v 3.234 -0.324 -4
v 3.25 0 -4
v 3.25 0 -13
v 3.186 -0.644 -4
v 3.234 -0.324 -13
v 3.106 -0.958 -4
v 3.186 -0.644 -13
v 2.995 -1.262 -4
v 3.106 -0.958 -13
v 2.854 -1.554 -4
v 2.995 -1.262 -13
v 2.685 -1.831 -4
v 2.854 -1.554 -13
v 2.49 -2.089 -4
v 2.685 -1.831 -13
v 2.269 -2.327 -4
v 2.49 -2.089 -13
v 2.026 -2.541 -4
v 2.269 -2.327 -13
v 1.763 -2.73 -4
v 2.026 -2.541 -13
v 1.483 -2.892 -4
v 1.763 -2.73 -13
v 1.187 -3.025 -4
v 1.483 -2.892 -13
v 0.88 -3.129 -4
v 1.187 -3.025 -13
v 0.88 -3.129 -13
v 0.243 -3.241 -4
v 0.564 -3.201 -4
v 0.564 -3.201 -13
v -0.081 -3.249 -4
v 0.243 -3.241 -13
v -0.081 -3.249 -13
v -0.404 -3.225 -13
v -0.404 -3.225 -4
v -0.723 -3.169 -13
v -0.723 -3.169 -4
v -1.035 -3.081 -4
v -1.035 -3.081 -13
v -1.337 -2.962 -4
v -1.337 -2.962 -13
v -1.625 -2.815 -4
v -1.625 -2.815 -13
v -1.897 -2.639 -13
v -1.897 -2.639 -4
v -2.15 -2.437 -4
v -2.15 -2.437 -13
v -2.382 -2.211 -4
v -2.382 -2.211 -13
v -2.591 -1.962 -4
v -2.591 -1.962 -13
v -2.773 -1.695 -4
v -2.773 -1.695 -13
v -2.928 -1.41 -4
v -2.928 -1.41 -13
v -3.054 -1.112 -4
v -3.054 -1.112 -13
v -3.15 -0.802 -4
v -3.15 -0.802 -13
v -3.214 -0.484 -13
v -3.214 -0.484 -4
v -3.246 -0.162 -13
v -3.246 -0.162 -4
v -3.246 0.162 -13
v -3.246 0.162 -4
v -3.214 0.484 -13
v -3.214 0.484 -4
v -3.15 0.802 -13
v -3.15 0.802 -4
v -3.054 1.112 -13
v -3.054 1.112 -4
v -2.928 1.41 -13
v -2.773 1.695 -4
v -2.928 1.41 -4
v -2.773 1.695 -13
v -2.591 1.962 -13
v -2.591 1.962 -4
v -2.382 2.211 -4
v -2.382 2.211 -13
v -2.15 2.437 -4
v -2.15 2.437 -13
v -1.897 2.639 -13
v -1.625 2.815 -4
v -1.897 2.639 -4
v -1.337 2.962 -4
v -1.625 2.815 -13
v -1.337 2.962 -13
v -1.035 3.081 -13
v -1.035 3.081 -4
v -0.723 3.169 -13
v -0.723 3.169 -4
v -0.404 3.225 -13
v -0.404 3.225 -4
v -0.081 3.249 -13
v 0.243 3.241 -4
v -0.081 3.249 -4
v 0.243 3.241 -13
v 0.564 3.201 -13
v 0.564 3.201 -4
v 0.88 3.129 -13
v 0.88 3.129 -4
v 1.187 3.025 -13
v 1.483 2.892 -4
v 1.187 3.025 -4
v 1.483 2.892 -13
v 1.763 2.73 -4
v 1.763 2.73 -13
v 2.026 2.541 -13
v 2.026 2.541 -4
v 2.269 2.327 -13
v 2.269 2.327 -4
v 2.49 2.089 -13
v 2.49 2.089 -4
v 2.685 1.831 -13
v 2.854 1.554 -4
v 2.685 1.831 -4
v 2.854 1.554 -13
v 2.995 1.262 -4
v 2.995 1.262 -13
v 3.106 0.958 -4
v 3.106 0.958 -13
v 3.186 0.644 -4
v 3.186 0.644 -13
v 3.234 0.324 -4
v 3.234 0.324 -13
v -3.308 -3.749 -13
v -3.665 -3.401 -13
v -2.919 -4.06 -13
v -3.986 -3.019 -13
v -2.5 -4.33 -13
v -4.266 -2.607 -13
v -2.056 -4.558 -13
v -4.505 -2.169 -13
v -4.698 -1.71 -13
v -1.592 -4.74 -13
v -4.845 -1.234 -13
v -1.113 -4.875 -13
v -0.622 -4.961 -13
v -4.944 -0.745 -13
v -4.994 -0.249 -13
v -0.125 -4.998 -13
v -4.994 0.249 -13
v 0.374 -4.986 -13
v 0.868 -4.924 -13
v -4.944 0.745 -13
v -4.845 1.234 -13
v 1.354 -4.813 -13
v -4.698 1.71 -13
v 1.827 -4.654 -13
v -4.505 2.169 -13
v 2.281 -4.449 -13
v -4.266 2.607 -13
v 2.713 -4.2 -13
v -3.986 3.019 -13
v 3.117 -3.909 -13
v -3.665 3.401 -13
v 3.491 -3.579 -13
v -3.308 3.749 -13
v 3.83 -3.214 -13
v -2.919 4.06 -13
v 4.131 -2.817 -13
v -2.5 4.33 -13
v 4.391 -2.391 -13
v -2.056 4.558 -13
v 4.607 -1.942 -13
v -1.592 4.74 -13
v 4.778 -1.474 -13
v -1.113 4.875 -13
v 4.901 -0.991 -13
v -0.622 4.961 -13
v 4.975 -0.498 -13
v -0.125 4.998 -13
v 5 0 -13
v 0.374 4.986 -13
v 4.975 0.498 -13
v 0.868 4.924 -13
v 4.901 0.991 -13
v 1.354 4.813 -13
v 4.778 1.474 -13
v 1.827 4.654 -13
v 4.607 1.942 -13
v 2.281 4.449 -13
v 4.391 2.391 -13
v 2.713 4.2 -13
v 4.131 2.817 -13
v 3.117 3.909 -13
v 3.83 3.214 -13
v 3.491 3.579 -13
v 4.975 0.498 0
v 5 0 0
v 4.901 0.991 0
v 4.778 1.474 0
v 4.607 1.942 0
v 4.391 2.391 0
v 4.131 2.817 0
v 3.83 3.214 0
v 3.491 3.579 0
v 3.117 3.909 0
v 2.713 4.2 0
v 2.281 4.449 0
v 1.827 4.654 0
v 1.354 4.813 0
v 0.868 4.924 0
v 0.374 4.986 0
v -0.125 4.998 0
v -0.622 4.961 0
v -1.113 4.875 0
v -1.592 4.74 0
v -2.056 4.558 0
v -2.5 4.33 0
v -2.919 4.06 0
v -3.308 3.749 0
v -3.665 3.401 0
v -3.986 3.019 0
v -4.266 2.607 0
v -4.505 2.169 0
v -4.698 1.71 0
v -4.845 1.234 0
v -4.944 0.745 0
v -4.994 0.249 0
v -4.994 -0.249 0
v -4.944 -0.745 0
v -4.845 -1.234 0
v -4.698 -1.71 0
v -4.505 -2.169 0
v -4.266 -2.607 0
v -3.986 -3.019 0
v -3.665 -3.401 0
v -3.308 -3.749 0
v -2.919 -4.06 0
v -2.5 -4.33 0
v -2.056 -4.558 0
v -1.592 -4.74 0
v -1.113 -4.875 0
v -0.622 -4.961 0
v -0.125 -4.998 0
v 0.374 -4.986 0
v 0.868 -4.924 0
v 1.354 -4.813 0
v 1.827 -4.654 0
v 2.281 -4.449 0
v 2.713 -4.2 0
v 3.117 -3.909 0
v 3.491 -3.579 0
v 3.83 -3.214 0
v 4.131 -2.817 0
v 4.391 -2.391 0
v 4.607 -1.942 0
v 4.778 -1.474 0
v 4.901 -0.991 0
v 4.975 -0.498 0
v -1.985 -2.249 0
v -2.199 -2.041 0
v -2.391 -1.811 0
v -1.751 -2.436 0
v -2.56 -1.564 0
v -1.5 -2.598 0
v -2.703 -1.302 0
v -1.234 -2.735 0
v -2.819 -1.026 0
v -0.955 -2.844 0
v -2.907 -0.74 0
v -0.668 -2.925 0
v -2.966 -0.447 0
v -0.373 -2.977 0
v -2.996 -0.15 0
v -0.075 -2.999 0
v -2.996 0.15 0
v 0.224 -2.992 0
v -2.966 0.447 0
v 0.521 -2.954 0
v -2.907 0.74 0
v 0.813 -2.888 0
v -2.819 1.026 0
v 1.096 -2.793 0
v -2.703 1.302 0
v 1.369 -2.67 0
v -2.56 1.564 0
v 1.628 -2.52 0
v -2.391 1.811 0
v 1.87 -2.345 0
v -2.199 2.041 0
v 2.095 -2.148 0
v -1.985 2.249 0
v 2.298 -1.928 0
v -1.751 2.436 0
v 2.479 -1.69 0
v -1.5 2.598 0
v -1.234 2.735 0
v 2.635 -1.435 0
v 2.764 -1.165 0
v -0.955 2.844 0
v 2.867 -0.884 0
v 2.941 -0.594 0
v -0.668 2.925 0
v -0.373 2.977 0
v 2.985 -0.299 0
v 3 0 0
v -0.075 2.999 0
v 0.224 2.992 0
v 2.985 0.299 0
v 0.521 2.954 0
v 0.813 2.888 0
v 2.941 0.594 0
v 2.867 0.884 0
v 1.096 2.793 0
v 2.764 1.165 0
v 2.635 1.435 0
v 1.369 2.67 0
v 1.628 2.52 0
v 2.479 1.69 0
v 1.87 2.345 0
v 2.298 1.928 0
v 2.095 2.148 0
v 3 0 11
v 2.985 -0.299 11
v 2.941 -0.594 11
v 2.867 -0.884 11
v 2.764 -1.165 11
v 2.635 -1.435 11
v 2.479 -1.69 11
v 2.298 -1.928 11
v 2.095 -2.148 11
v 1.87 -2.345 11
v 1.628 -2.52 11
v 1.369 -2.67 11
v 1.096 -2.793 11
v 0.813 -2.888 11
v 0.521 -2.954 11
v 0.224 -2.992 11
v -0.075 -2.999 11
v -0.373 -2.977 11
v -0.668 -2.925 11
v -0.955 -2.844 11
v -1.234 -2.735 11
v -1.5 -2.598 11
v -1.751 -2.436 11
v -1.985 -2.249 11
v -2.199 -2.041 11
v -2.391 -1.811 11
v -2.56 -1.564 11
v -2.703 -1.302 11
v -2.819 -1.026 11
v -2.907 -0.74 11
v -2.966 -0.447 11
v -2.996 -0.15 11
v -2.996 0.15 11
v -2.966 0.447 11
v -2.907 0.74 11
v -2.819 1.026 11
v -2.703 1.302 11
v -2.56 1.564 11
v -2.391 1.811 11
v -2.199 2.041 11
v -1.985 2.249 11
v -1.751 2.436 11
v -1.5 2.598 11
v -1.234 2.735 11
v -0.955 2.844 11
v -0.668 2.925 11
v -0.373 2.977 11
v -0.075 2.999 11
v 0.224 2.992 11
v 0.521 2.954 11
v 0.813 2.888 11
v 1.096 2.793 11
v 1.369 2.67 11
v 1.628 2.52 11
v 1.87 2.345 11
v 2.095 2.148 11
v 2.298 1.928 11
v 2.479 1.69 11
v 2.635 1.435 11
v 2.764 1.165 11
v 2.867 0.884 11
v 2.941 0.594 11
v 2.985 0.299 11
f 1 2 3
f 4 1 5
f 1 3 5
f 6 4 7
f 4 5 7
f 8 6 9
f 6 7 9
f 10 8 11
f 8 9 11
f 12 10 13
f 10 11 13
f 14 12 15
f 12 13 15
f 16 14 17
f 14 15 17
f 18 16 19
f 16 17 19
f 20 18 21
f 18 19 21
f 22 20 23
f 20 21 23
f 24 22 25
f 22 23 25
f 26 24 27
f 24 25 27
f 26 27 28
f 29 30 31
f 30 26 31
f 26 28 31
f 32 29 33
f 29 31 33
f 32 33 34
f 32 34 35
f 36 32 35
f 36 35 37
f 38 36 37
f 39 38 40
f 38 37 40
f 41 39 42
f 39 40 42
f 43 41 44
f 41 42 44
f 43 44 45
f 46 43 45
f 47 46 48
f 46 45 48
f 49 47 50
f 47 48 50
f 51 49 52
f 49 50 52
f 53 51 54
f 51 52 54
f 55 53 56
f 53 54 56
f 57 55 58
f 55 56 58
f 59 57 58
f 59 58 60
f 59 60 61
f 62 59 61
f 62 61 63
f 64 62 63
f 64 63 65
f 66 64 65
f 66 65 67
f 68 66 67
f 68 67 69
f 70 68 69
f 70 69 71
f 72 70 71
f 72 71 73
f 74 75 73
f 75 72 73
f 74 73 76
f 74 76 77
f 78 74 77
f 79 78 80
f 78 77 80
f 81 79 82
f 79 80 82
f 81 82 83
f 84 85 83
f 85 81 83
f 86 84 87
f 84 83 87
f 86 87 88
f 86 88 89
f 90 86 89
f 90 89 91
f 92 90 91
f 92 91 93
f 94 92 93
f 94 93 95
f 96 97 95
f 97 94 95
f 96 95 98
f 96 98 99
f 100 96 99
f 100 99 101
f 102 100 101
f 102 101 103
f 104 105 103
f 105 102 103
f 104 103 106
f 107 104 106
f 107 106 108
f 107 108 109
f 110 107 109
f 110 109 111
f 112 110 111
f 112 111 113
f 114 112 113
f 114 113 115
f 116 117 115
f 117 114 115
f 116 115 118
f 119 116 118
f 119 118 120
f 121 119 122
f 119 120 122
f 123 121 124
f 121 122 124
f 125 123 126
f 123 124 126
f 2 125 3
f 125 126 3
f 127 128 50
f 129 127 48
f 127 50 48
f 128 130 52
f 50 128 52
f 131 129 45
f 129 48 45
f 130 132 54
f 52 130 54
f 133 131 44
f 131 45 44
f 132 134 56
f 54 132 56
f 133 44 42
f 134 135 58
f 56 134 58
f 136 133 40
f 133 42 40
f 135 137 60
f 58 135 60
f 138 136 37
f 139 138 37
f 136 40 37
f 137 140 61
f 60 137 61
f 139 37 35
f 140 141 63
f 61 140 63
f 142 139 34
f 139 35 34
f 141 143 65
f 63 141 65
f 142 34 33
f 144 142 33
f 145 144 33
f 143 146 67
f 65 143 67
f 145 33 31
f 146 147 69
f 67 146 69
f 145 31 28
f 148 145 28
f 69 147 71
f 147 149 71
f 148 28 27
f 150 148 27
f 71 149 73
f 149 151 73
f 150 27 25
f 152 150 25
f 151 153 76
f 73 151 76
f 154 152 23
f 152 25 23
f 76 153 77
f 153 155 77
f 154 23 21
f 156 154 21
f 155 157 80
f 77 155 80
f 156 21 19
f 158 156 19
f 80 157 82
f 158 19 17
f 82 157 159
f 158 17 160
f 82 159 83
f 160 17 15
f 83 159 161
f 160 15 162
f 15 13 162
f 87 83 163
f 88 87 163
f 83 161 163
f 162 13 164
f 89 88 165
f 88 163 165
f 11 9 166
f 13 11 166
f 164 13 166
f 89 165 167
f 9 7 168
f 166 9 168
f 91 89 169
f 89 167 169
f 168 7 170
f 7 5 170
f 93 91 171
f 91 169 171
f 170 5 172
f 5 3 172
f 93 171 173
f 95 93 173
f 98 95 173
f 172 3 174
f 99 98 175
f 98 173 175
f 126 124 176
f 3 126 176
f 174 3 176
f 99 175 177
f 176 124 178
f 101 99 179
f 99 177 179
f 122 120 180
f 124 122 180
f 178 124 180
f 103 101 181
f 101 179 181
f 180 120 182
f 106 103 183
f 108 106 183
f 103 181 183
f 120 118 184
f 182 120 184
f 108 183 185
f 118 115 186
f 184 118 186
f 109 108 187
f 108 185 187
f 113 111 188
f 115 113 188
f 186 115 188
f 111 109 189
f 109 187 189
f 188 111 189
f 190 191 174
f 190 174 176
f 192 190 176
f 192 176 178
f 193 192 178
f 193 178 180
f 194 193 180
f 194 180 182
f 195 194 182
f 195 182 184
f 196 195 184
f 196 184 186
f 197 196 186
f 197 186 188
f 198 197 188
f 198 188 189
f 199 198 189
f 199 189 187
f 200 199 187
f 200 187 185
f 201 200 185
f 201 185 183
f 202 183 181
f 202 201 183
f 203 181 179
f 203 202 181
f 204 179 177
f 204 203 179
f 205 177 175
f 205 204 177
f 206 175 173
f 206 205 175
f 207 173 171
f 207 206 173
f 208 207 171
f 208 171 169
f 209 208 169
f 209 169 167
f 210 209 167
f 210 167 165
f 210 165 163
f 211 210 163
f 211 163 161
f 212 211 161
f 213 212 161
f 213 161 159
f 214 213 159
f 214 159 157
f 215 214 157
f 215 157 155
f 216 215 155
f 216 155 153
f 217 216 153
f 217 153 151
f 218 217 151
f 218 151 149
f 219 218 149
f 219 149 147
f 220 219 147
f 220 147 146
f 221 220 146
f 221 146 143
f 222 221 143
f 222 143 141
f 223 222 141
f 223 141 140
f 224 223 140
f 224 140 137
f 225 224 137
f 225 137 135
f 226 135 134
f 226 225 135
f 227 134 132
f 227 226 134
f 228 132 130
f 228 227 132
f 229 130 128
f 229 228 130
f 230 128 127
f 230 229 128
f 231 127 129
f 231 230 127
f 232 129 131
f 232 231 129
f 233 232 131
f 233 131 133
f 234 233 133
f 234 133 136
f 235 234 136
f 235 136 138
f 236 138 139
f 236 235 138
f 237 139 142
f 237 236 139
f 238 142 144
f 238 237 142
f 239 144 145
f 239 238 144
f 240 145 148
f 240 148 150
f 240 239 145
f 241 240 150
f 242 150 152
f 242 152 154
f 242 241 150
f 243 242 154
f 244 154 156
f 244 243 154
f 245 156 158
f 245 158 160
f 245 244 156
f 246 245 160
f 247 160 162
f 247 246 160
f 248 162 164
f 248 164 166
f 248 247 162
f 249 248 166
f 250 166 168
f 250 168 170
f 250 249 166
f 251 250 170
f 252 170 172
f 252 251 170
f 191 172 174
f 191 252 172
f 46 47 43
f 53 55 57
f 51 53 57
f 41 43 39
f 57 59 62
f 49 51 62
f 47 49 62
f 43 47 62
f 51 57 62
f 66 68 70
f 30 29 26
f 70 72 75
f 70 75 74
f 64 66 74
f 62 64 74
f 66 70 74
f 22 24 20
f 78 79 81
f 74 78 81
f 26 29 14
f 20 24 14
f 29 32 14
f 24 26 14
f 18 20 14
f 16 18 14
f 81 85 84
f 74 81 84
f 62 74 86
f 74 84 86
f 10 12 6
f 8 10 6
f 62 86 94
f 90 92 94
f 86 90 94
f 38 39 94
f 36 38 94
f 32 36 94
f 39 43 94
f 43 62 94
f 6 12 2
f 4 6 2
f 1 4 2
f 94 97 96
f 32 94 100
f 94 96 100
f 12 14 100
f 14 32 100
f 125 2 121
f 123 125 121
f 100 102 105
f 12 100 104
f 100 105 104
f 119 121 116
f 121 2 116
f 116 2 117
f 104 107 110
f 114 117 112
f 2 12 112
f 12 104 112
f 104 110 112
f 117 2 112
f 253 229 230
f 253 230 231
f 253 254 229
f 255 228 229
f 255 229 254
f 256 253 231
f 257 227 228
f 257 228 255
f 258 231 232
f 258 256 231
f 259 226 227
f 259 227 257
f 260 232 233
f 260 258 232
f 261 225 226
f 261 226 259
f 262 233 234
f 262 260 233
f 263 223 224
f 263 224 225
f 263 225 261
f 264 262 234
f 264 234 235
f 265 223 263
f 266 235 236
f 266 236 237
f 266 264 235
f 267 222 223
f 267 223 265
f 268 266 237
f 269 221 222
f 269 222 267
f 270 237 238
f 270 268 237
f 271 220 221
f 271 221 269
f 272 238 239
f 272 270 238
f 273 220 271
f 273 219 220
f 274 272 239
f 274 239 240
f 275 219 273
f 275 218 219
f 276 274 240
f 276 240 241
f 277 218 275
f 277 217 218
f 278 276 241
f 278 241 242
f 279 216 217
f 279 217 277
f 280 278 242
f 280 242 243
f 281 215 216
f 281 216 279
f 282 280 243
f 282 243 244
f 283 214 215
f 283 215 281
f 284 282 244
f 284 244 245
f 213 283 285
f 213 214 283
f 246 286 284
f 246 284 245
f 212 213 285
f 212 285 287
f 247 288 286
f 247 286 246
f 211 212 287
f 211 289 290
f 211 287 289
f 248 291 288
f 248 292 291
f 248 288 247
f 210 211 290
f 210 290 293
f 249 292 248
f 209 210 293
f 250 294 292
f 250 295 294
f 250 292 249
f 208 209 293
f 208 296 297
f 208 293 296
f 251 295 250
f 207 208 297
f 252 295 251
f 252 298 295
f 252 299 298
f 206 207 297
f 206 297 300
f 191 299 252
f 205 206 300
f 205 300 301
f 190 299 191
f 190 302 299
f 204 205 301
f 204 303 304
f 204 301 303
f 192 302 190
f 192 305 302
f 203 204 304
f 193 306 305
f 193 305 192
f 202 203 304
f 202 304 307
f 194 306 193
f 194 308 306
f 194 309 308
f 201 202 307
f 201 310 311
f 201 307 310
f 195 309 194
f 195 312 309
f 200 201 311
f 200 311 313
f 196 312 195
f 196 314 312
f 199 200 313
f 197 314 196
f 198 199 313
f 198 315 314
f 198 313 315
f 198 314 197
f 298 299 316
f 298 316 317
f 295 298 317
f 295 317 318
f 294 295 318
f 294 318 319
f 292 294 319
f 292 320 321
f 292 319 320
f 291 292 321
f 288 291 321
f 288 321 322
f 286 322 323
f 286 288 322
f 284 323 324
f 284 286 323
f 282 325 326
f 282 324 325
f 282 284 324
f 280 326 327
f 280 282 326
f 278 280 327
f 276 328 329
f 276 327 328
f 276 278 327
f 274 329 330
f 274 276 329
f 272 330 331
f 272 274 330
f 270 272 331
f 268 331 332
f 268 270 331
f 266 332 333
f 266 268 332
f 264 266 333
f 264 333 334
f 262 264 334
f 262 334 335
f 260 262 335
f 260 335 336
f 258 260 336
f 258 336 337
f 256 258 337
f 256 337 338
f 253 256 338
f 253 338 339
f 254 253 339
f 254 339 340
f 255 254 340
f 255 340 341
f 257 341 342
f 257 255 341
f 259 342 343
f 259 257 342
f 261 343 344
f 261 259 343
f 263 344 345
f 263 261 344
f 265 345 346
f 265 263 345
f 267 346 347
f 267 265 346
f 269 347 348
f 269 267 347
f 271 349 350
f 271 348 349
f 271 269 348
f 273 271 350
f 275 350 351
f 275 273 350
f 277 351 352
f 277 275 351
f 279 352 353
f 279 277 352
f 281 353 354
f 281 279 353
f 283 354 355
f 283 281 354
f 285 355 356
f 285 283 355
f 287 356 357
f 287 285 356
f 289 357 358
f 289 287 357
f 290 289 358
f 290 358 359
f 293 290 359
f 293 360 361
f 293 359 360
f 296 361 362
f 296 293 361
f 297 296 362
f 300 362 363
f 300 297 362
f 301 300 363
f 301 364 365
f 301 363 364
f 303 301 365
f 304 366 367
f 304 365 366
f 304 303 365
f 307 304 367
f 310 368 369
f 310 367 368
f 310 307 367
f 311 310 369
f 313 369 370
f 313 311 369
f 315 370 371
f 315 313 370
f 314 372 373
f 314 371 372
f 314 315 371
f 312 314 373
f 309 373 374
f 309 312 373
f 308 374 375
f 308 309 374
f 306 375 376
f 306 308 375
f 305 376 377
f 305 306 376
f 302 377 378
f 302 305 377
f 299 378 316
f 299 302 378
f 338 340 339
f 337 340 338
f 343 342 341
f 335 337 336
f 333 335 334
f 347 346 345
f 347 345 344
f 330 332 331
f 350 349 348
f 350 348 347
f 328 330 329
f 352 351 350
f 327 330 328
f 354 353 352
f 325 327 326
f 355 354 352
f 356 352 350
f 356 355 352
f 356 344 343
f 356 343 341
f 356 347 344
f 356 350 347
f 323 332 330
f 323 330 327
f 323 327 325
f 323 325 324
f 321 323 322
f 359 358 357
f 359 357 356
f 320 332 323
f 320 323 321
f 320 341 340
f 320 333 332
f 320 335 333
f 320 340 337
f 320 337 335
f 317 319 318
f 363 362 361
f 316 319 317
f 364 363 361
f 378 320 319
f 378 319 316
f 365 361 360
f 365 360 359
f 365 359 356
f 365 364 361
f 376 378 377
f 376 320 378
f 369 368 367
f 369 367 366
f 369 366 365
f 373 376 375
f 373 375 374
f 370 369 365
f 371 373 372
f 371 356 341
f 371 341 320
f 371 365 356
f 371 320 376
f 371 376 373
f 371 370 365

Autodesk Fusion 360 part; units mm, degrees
sketch "Sketch1" plane through (0, 0, 0) normal (0, 0, 1) x (1, 0, 0)
  circle A0 centre (0, 0) radius 3
  circle A1 centre (0, 0) radius 5
  dimension "d1" = 6
  dimension "d4" = 10
extrude "Extrude1" add sketch "Sketch1" along normal blind 11 contours A0
extrude "Extrude2" add sketch "Sketch1" against normal blind 13 contours A0 | A1
ref_plane "WorkPlane1" through (0, 0, -15) normal (0, 0, 1) x (1, 0, 0)
sketch "Sketch2" plane through (0, 0, -15) normal (0, 0, 1) x (1, 0, 0)
  circle A0 centre (0, 0) radius 3.25
  dimension "d8" = 6.5
extrude "Extrude3" cut sketch "Sketch2" along normal blind 11
